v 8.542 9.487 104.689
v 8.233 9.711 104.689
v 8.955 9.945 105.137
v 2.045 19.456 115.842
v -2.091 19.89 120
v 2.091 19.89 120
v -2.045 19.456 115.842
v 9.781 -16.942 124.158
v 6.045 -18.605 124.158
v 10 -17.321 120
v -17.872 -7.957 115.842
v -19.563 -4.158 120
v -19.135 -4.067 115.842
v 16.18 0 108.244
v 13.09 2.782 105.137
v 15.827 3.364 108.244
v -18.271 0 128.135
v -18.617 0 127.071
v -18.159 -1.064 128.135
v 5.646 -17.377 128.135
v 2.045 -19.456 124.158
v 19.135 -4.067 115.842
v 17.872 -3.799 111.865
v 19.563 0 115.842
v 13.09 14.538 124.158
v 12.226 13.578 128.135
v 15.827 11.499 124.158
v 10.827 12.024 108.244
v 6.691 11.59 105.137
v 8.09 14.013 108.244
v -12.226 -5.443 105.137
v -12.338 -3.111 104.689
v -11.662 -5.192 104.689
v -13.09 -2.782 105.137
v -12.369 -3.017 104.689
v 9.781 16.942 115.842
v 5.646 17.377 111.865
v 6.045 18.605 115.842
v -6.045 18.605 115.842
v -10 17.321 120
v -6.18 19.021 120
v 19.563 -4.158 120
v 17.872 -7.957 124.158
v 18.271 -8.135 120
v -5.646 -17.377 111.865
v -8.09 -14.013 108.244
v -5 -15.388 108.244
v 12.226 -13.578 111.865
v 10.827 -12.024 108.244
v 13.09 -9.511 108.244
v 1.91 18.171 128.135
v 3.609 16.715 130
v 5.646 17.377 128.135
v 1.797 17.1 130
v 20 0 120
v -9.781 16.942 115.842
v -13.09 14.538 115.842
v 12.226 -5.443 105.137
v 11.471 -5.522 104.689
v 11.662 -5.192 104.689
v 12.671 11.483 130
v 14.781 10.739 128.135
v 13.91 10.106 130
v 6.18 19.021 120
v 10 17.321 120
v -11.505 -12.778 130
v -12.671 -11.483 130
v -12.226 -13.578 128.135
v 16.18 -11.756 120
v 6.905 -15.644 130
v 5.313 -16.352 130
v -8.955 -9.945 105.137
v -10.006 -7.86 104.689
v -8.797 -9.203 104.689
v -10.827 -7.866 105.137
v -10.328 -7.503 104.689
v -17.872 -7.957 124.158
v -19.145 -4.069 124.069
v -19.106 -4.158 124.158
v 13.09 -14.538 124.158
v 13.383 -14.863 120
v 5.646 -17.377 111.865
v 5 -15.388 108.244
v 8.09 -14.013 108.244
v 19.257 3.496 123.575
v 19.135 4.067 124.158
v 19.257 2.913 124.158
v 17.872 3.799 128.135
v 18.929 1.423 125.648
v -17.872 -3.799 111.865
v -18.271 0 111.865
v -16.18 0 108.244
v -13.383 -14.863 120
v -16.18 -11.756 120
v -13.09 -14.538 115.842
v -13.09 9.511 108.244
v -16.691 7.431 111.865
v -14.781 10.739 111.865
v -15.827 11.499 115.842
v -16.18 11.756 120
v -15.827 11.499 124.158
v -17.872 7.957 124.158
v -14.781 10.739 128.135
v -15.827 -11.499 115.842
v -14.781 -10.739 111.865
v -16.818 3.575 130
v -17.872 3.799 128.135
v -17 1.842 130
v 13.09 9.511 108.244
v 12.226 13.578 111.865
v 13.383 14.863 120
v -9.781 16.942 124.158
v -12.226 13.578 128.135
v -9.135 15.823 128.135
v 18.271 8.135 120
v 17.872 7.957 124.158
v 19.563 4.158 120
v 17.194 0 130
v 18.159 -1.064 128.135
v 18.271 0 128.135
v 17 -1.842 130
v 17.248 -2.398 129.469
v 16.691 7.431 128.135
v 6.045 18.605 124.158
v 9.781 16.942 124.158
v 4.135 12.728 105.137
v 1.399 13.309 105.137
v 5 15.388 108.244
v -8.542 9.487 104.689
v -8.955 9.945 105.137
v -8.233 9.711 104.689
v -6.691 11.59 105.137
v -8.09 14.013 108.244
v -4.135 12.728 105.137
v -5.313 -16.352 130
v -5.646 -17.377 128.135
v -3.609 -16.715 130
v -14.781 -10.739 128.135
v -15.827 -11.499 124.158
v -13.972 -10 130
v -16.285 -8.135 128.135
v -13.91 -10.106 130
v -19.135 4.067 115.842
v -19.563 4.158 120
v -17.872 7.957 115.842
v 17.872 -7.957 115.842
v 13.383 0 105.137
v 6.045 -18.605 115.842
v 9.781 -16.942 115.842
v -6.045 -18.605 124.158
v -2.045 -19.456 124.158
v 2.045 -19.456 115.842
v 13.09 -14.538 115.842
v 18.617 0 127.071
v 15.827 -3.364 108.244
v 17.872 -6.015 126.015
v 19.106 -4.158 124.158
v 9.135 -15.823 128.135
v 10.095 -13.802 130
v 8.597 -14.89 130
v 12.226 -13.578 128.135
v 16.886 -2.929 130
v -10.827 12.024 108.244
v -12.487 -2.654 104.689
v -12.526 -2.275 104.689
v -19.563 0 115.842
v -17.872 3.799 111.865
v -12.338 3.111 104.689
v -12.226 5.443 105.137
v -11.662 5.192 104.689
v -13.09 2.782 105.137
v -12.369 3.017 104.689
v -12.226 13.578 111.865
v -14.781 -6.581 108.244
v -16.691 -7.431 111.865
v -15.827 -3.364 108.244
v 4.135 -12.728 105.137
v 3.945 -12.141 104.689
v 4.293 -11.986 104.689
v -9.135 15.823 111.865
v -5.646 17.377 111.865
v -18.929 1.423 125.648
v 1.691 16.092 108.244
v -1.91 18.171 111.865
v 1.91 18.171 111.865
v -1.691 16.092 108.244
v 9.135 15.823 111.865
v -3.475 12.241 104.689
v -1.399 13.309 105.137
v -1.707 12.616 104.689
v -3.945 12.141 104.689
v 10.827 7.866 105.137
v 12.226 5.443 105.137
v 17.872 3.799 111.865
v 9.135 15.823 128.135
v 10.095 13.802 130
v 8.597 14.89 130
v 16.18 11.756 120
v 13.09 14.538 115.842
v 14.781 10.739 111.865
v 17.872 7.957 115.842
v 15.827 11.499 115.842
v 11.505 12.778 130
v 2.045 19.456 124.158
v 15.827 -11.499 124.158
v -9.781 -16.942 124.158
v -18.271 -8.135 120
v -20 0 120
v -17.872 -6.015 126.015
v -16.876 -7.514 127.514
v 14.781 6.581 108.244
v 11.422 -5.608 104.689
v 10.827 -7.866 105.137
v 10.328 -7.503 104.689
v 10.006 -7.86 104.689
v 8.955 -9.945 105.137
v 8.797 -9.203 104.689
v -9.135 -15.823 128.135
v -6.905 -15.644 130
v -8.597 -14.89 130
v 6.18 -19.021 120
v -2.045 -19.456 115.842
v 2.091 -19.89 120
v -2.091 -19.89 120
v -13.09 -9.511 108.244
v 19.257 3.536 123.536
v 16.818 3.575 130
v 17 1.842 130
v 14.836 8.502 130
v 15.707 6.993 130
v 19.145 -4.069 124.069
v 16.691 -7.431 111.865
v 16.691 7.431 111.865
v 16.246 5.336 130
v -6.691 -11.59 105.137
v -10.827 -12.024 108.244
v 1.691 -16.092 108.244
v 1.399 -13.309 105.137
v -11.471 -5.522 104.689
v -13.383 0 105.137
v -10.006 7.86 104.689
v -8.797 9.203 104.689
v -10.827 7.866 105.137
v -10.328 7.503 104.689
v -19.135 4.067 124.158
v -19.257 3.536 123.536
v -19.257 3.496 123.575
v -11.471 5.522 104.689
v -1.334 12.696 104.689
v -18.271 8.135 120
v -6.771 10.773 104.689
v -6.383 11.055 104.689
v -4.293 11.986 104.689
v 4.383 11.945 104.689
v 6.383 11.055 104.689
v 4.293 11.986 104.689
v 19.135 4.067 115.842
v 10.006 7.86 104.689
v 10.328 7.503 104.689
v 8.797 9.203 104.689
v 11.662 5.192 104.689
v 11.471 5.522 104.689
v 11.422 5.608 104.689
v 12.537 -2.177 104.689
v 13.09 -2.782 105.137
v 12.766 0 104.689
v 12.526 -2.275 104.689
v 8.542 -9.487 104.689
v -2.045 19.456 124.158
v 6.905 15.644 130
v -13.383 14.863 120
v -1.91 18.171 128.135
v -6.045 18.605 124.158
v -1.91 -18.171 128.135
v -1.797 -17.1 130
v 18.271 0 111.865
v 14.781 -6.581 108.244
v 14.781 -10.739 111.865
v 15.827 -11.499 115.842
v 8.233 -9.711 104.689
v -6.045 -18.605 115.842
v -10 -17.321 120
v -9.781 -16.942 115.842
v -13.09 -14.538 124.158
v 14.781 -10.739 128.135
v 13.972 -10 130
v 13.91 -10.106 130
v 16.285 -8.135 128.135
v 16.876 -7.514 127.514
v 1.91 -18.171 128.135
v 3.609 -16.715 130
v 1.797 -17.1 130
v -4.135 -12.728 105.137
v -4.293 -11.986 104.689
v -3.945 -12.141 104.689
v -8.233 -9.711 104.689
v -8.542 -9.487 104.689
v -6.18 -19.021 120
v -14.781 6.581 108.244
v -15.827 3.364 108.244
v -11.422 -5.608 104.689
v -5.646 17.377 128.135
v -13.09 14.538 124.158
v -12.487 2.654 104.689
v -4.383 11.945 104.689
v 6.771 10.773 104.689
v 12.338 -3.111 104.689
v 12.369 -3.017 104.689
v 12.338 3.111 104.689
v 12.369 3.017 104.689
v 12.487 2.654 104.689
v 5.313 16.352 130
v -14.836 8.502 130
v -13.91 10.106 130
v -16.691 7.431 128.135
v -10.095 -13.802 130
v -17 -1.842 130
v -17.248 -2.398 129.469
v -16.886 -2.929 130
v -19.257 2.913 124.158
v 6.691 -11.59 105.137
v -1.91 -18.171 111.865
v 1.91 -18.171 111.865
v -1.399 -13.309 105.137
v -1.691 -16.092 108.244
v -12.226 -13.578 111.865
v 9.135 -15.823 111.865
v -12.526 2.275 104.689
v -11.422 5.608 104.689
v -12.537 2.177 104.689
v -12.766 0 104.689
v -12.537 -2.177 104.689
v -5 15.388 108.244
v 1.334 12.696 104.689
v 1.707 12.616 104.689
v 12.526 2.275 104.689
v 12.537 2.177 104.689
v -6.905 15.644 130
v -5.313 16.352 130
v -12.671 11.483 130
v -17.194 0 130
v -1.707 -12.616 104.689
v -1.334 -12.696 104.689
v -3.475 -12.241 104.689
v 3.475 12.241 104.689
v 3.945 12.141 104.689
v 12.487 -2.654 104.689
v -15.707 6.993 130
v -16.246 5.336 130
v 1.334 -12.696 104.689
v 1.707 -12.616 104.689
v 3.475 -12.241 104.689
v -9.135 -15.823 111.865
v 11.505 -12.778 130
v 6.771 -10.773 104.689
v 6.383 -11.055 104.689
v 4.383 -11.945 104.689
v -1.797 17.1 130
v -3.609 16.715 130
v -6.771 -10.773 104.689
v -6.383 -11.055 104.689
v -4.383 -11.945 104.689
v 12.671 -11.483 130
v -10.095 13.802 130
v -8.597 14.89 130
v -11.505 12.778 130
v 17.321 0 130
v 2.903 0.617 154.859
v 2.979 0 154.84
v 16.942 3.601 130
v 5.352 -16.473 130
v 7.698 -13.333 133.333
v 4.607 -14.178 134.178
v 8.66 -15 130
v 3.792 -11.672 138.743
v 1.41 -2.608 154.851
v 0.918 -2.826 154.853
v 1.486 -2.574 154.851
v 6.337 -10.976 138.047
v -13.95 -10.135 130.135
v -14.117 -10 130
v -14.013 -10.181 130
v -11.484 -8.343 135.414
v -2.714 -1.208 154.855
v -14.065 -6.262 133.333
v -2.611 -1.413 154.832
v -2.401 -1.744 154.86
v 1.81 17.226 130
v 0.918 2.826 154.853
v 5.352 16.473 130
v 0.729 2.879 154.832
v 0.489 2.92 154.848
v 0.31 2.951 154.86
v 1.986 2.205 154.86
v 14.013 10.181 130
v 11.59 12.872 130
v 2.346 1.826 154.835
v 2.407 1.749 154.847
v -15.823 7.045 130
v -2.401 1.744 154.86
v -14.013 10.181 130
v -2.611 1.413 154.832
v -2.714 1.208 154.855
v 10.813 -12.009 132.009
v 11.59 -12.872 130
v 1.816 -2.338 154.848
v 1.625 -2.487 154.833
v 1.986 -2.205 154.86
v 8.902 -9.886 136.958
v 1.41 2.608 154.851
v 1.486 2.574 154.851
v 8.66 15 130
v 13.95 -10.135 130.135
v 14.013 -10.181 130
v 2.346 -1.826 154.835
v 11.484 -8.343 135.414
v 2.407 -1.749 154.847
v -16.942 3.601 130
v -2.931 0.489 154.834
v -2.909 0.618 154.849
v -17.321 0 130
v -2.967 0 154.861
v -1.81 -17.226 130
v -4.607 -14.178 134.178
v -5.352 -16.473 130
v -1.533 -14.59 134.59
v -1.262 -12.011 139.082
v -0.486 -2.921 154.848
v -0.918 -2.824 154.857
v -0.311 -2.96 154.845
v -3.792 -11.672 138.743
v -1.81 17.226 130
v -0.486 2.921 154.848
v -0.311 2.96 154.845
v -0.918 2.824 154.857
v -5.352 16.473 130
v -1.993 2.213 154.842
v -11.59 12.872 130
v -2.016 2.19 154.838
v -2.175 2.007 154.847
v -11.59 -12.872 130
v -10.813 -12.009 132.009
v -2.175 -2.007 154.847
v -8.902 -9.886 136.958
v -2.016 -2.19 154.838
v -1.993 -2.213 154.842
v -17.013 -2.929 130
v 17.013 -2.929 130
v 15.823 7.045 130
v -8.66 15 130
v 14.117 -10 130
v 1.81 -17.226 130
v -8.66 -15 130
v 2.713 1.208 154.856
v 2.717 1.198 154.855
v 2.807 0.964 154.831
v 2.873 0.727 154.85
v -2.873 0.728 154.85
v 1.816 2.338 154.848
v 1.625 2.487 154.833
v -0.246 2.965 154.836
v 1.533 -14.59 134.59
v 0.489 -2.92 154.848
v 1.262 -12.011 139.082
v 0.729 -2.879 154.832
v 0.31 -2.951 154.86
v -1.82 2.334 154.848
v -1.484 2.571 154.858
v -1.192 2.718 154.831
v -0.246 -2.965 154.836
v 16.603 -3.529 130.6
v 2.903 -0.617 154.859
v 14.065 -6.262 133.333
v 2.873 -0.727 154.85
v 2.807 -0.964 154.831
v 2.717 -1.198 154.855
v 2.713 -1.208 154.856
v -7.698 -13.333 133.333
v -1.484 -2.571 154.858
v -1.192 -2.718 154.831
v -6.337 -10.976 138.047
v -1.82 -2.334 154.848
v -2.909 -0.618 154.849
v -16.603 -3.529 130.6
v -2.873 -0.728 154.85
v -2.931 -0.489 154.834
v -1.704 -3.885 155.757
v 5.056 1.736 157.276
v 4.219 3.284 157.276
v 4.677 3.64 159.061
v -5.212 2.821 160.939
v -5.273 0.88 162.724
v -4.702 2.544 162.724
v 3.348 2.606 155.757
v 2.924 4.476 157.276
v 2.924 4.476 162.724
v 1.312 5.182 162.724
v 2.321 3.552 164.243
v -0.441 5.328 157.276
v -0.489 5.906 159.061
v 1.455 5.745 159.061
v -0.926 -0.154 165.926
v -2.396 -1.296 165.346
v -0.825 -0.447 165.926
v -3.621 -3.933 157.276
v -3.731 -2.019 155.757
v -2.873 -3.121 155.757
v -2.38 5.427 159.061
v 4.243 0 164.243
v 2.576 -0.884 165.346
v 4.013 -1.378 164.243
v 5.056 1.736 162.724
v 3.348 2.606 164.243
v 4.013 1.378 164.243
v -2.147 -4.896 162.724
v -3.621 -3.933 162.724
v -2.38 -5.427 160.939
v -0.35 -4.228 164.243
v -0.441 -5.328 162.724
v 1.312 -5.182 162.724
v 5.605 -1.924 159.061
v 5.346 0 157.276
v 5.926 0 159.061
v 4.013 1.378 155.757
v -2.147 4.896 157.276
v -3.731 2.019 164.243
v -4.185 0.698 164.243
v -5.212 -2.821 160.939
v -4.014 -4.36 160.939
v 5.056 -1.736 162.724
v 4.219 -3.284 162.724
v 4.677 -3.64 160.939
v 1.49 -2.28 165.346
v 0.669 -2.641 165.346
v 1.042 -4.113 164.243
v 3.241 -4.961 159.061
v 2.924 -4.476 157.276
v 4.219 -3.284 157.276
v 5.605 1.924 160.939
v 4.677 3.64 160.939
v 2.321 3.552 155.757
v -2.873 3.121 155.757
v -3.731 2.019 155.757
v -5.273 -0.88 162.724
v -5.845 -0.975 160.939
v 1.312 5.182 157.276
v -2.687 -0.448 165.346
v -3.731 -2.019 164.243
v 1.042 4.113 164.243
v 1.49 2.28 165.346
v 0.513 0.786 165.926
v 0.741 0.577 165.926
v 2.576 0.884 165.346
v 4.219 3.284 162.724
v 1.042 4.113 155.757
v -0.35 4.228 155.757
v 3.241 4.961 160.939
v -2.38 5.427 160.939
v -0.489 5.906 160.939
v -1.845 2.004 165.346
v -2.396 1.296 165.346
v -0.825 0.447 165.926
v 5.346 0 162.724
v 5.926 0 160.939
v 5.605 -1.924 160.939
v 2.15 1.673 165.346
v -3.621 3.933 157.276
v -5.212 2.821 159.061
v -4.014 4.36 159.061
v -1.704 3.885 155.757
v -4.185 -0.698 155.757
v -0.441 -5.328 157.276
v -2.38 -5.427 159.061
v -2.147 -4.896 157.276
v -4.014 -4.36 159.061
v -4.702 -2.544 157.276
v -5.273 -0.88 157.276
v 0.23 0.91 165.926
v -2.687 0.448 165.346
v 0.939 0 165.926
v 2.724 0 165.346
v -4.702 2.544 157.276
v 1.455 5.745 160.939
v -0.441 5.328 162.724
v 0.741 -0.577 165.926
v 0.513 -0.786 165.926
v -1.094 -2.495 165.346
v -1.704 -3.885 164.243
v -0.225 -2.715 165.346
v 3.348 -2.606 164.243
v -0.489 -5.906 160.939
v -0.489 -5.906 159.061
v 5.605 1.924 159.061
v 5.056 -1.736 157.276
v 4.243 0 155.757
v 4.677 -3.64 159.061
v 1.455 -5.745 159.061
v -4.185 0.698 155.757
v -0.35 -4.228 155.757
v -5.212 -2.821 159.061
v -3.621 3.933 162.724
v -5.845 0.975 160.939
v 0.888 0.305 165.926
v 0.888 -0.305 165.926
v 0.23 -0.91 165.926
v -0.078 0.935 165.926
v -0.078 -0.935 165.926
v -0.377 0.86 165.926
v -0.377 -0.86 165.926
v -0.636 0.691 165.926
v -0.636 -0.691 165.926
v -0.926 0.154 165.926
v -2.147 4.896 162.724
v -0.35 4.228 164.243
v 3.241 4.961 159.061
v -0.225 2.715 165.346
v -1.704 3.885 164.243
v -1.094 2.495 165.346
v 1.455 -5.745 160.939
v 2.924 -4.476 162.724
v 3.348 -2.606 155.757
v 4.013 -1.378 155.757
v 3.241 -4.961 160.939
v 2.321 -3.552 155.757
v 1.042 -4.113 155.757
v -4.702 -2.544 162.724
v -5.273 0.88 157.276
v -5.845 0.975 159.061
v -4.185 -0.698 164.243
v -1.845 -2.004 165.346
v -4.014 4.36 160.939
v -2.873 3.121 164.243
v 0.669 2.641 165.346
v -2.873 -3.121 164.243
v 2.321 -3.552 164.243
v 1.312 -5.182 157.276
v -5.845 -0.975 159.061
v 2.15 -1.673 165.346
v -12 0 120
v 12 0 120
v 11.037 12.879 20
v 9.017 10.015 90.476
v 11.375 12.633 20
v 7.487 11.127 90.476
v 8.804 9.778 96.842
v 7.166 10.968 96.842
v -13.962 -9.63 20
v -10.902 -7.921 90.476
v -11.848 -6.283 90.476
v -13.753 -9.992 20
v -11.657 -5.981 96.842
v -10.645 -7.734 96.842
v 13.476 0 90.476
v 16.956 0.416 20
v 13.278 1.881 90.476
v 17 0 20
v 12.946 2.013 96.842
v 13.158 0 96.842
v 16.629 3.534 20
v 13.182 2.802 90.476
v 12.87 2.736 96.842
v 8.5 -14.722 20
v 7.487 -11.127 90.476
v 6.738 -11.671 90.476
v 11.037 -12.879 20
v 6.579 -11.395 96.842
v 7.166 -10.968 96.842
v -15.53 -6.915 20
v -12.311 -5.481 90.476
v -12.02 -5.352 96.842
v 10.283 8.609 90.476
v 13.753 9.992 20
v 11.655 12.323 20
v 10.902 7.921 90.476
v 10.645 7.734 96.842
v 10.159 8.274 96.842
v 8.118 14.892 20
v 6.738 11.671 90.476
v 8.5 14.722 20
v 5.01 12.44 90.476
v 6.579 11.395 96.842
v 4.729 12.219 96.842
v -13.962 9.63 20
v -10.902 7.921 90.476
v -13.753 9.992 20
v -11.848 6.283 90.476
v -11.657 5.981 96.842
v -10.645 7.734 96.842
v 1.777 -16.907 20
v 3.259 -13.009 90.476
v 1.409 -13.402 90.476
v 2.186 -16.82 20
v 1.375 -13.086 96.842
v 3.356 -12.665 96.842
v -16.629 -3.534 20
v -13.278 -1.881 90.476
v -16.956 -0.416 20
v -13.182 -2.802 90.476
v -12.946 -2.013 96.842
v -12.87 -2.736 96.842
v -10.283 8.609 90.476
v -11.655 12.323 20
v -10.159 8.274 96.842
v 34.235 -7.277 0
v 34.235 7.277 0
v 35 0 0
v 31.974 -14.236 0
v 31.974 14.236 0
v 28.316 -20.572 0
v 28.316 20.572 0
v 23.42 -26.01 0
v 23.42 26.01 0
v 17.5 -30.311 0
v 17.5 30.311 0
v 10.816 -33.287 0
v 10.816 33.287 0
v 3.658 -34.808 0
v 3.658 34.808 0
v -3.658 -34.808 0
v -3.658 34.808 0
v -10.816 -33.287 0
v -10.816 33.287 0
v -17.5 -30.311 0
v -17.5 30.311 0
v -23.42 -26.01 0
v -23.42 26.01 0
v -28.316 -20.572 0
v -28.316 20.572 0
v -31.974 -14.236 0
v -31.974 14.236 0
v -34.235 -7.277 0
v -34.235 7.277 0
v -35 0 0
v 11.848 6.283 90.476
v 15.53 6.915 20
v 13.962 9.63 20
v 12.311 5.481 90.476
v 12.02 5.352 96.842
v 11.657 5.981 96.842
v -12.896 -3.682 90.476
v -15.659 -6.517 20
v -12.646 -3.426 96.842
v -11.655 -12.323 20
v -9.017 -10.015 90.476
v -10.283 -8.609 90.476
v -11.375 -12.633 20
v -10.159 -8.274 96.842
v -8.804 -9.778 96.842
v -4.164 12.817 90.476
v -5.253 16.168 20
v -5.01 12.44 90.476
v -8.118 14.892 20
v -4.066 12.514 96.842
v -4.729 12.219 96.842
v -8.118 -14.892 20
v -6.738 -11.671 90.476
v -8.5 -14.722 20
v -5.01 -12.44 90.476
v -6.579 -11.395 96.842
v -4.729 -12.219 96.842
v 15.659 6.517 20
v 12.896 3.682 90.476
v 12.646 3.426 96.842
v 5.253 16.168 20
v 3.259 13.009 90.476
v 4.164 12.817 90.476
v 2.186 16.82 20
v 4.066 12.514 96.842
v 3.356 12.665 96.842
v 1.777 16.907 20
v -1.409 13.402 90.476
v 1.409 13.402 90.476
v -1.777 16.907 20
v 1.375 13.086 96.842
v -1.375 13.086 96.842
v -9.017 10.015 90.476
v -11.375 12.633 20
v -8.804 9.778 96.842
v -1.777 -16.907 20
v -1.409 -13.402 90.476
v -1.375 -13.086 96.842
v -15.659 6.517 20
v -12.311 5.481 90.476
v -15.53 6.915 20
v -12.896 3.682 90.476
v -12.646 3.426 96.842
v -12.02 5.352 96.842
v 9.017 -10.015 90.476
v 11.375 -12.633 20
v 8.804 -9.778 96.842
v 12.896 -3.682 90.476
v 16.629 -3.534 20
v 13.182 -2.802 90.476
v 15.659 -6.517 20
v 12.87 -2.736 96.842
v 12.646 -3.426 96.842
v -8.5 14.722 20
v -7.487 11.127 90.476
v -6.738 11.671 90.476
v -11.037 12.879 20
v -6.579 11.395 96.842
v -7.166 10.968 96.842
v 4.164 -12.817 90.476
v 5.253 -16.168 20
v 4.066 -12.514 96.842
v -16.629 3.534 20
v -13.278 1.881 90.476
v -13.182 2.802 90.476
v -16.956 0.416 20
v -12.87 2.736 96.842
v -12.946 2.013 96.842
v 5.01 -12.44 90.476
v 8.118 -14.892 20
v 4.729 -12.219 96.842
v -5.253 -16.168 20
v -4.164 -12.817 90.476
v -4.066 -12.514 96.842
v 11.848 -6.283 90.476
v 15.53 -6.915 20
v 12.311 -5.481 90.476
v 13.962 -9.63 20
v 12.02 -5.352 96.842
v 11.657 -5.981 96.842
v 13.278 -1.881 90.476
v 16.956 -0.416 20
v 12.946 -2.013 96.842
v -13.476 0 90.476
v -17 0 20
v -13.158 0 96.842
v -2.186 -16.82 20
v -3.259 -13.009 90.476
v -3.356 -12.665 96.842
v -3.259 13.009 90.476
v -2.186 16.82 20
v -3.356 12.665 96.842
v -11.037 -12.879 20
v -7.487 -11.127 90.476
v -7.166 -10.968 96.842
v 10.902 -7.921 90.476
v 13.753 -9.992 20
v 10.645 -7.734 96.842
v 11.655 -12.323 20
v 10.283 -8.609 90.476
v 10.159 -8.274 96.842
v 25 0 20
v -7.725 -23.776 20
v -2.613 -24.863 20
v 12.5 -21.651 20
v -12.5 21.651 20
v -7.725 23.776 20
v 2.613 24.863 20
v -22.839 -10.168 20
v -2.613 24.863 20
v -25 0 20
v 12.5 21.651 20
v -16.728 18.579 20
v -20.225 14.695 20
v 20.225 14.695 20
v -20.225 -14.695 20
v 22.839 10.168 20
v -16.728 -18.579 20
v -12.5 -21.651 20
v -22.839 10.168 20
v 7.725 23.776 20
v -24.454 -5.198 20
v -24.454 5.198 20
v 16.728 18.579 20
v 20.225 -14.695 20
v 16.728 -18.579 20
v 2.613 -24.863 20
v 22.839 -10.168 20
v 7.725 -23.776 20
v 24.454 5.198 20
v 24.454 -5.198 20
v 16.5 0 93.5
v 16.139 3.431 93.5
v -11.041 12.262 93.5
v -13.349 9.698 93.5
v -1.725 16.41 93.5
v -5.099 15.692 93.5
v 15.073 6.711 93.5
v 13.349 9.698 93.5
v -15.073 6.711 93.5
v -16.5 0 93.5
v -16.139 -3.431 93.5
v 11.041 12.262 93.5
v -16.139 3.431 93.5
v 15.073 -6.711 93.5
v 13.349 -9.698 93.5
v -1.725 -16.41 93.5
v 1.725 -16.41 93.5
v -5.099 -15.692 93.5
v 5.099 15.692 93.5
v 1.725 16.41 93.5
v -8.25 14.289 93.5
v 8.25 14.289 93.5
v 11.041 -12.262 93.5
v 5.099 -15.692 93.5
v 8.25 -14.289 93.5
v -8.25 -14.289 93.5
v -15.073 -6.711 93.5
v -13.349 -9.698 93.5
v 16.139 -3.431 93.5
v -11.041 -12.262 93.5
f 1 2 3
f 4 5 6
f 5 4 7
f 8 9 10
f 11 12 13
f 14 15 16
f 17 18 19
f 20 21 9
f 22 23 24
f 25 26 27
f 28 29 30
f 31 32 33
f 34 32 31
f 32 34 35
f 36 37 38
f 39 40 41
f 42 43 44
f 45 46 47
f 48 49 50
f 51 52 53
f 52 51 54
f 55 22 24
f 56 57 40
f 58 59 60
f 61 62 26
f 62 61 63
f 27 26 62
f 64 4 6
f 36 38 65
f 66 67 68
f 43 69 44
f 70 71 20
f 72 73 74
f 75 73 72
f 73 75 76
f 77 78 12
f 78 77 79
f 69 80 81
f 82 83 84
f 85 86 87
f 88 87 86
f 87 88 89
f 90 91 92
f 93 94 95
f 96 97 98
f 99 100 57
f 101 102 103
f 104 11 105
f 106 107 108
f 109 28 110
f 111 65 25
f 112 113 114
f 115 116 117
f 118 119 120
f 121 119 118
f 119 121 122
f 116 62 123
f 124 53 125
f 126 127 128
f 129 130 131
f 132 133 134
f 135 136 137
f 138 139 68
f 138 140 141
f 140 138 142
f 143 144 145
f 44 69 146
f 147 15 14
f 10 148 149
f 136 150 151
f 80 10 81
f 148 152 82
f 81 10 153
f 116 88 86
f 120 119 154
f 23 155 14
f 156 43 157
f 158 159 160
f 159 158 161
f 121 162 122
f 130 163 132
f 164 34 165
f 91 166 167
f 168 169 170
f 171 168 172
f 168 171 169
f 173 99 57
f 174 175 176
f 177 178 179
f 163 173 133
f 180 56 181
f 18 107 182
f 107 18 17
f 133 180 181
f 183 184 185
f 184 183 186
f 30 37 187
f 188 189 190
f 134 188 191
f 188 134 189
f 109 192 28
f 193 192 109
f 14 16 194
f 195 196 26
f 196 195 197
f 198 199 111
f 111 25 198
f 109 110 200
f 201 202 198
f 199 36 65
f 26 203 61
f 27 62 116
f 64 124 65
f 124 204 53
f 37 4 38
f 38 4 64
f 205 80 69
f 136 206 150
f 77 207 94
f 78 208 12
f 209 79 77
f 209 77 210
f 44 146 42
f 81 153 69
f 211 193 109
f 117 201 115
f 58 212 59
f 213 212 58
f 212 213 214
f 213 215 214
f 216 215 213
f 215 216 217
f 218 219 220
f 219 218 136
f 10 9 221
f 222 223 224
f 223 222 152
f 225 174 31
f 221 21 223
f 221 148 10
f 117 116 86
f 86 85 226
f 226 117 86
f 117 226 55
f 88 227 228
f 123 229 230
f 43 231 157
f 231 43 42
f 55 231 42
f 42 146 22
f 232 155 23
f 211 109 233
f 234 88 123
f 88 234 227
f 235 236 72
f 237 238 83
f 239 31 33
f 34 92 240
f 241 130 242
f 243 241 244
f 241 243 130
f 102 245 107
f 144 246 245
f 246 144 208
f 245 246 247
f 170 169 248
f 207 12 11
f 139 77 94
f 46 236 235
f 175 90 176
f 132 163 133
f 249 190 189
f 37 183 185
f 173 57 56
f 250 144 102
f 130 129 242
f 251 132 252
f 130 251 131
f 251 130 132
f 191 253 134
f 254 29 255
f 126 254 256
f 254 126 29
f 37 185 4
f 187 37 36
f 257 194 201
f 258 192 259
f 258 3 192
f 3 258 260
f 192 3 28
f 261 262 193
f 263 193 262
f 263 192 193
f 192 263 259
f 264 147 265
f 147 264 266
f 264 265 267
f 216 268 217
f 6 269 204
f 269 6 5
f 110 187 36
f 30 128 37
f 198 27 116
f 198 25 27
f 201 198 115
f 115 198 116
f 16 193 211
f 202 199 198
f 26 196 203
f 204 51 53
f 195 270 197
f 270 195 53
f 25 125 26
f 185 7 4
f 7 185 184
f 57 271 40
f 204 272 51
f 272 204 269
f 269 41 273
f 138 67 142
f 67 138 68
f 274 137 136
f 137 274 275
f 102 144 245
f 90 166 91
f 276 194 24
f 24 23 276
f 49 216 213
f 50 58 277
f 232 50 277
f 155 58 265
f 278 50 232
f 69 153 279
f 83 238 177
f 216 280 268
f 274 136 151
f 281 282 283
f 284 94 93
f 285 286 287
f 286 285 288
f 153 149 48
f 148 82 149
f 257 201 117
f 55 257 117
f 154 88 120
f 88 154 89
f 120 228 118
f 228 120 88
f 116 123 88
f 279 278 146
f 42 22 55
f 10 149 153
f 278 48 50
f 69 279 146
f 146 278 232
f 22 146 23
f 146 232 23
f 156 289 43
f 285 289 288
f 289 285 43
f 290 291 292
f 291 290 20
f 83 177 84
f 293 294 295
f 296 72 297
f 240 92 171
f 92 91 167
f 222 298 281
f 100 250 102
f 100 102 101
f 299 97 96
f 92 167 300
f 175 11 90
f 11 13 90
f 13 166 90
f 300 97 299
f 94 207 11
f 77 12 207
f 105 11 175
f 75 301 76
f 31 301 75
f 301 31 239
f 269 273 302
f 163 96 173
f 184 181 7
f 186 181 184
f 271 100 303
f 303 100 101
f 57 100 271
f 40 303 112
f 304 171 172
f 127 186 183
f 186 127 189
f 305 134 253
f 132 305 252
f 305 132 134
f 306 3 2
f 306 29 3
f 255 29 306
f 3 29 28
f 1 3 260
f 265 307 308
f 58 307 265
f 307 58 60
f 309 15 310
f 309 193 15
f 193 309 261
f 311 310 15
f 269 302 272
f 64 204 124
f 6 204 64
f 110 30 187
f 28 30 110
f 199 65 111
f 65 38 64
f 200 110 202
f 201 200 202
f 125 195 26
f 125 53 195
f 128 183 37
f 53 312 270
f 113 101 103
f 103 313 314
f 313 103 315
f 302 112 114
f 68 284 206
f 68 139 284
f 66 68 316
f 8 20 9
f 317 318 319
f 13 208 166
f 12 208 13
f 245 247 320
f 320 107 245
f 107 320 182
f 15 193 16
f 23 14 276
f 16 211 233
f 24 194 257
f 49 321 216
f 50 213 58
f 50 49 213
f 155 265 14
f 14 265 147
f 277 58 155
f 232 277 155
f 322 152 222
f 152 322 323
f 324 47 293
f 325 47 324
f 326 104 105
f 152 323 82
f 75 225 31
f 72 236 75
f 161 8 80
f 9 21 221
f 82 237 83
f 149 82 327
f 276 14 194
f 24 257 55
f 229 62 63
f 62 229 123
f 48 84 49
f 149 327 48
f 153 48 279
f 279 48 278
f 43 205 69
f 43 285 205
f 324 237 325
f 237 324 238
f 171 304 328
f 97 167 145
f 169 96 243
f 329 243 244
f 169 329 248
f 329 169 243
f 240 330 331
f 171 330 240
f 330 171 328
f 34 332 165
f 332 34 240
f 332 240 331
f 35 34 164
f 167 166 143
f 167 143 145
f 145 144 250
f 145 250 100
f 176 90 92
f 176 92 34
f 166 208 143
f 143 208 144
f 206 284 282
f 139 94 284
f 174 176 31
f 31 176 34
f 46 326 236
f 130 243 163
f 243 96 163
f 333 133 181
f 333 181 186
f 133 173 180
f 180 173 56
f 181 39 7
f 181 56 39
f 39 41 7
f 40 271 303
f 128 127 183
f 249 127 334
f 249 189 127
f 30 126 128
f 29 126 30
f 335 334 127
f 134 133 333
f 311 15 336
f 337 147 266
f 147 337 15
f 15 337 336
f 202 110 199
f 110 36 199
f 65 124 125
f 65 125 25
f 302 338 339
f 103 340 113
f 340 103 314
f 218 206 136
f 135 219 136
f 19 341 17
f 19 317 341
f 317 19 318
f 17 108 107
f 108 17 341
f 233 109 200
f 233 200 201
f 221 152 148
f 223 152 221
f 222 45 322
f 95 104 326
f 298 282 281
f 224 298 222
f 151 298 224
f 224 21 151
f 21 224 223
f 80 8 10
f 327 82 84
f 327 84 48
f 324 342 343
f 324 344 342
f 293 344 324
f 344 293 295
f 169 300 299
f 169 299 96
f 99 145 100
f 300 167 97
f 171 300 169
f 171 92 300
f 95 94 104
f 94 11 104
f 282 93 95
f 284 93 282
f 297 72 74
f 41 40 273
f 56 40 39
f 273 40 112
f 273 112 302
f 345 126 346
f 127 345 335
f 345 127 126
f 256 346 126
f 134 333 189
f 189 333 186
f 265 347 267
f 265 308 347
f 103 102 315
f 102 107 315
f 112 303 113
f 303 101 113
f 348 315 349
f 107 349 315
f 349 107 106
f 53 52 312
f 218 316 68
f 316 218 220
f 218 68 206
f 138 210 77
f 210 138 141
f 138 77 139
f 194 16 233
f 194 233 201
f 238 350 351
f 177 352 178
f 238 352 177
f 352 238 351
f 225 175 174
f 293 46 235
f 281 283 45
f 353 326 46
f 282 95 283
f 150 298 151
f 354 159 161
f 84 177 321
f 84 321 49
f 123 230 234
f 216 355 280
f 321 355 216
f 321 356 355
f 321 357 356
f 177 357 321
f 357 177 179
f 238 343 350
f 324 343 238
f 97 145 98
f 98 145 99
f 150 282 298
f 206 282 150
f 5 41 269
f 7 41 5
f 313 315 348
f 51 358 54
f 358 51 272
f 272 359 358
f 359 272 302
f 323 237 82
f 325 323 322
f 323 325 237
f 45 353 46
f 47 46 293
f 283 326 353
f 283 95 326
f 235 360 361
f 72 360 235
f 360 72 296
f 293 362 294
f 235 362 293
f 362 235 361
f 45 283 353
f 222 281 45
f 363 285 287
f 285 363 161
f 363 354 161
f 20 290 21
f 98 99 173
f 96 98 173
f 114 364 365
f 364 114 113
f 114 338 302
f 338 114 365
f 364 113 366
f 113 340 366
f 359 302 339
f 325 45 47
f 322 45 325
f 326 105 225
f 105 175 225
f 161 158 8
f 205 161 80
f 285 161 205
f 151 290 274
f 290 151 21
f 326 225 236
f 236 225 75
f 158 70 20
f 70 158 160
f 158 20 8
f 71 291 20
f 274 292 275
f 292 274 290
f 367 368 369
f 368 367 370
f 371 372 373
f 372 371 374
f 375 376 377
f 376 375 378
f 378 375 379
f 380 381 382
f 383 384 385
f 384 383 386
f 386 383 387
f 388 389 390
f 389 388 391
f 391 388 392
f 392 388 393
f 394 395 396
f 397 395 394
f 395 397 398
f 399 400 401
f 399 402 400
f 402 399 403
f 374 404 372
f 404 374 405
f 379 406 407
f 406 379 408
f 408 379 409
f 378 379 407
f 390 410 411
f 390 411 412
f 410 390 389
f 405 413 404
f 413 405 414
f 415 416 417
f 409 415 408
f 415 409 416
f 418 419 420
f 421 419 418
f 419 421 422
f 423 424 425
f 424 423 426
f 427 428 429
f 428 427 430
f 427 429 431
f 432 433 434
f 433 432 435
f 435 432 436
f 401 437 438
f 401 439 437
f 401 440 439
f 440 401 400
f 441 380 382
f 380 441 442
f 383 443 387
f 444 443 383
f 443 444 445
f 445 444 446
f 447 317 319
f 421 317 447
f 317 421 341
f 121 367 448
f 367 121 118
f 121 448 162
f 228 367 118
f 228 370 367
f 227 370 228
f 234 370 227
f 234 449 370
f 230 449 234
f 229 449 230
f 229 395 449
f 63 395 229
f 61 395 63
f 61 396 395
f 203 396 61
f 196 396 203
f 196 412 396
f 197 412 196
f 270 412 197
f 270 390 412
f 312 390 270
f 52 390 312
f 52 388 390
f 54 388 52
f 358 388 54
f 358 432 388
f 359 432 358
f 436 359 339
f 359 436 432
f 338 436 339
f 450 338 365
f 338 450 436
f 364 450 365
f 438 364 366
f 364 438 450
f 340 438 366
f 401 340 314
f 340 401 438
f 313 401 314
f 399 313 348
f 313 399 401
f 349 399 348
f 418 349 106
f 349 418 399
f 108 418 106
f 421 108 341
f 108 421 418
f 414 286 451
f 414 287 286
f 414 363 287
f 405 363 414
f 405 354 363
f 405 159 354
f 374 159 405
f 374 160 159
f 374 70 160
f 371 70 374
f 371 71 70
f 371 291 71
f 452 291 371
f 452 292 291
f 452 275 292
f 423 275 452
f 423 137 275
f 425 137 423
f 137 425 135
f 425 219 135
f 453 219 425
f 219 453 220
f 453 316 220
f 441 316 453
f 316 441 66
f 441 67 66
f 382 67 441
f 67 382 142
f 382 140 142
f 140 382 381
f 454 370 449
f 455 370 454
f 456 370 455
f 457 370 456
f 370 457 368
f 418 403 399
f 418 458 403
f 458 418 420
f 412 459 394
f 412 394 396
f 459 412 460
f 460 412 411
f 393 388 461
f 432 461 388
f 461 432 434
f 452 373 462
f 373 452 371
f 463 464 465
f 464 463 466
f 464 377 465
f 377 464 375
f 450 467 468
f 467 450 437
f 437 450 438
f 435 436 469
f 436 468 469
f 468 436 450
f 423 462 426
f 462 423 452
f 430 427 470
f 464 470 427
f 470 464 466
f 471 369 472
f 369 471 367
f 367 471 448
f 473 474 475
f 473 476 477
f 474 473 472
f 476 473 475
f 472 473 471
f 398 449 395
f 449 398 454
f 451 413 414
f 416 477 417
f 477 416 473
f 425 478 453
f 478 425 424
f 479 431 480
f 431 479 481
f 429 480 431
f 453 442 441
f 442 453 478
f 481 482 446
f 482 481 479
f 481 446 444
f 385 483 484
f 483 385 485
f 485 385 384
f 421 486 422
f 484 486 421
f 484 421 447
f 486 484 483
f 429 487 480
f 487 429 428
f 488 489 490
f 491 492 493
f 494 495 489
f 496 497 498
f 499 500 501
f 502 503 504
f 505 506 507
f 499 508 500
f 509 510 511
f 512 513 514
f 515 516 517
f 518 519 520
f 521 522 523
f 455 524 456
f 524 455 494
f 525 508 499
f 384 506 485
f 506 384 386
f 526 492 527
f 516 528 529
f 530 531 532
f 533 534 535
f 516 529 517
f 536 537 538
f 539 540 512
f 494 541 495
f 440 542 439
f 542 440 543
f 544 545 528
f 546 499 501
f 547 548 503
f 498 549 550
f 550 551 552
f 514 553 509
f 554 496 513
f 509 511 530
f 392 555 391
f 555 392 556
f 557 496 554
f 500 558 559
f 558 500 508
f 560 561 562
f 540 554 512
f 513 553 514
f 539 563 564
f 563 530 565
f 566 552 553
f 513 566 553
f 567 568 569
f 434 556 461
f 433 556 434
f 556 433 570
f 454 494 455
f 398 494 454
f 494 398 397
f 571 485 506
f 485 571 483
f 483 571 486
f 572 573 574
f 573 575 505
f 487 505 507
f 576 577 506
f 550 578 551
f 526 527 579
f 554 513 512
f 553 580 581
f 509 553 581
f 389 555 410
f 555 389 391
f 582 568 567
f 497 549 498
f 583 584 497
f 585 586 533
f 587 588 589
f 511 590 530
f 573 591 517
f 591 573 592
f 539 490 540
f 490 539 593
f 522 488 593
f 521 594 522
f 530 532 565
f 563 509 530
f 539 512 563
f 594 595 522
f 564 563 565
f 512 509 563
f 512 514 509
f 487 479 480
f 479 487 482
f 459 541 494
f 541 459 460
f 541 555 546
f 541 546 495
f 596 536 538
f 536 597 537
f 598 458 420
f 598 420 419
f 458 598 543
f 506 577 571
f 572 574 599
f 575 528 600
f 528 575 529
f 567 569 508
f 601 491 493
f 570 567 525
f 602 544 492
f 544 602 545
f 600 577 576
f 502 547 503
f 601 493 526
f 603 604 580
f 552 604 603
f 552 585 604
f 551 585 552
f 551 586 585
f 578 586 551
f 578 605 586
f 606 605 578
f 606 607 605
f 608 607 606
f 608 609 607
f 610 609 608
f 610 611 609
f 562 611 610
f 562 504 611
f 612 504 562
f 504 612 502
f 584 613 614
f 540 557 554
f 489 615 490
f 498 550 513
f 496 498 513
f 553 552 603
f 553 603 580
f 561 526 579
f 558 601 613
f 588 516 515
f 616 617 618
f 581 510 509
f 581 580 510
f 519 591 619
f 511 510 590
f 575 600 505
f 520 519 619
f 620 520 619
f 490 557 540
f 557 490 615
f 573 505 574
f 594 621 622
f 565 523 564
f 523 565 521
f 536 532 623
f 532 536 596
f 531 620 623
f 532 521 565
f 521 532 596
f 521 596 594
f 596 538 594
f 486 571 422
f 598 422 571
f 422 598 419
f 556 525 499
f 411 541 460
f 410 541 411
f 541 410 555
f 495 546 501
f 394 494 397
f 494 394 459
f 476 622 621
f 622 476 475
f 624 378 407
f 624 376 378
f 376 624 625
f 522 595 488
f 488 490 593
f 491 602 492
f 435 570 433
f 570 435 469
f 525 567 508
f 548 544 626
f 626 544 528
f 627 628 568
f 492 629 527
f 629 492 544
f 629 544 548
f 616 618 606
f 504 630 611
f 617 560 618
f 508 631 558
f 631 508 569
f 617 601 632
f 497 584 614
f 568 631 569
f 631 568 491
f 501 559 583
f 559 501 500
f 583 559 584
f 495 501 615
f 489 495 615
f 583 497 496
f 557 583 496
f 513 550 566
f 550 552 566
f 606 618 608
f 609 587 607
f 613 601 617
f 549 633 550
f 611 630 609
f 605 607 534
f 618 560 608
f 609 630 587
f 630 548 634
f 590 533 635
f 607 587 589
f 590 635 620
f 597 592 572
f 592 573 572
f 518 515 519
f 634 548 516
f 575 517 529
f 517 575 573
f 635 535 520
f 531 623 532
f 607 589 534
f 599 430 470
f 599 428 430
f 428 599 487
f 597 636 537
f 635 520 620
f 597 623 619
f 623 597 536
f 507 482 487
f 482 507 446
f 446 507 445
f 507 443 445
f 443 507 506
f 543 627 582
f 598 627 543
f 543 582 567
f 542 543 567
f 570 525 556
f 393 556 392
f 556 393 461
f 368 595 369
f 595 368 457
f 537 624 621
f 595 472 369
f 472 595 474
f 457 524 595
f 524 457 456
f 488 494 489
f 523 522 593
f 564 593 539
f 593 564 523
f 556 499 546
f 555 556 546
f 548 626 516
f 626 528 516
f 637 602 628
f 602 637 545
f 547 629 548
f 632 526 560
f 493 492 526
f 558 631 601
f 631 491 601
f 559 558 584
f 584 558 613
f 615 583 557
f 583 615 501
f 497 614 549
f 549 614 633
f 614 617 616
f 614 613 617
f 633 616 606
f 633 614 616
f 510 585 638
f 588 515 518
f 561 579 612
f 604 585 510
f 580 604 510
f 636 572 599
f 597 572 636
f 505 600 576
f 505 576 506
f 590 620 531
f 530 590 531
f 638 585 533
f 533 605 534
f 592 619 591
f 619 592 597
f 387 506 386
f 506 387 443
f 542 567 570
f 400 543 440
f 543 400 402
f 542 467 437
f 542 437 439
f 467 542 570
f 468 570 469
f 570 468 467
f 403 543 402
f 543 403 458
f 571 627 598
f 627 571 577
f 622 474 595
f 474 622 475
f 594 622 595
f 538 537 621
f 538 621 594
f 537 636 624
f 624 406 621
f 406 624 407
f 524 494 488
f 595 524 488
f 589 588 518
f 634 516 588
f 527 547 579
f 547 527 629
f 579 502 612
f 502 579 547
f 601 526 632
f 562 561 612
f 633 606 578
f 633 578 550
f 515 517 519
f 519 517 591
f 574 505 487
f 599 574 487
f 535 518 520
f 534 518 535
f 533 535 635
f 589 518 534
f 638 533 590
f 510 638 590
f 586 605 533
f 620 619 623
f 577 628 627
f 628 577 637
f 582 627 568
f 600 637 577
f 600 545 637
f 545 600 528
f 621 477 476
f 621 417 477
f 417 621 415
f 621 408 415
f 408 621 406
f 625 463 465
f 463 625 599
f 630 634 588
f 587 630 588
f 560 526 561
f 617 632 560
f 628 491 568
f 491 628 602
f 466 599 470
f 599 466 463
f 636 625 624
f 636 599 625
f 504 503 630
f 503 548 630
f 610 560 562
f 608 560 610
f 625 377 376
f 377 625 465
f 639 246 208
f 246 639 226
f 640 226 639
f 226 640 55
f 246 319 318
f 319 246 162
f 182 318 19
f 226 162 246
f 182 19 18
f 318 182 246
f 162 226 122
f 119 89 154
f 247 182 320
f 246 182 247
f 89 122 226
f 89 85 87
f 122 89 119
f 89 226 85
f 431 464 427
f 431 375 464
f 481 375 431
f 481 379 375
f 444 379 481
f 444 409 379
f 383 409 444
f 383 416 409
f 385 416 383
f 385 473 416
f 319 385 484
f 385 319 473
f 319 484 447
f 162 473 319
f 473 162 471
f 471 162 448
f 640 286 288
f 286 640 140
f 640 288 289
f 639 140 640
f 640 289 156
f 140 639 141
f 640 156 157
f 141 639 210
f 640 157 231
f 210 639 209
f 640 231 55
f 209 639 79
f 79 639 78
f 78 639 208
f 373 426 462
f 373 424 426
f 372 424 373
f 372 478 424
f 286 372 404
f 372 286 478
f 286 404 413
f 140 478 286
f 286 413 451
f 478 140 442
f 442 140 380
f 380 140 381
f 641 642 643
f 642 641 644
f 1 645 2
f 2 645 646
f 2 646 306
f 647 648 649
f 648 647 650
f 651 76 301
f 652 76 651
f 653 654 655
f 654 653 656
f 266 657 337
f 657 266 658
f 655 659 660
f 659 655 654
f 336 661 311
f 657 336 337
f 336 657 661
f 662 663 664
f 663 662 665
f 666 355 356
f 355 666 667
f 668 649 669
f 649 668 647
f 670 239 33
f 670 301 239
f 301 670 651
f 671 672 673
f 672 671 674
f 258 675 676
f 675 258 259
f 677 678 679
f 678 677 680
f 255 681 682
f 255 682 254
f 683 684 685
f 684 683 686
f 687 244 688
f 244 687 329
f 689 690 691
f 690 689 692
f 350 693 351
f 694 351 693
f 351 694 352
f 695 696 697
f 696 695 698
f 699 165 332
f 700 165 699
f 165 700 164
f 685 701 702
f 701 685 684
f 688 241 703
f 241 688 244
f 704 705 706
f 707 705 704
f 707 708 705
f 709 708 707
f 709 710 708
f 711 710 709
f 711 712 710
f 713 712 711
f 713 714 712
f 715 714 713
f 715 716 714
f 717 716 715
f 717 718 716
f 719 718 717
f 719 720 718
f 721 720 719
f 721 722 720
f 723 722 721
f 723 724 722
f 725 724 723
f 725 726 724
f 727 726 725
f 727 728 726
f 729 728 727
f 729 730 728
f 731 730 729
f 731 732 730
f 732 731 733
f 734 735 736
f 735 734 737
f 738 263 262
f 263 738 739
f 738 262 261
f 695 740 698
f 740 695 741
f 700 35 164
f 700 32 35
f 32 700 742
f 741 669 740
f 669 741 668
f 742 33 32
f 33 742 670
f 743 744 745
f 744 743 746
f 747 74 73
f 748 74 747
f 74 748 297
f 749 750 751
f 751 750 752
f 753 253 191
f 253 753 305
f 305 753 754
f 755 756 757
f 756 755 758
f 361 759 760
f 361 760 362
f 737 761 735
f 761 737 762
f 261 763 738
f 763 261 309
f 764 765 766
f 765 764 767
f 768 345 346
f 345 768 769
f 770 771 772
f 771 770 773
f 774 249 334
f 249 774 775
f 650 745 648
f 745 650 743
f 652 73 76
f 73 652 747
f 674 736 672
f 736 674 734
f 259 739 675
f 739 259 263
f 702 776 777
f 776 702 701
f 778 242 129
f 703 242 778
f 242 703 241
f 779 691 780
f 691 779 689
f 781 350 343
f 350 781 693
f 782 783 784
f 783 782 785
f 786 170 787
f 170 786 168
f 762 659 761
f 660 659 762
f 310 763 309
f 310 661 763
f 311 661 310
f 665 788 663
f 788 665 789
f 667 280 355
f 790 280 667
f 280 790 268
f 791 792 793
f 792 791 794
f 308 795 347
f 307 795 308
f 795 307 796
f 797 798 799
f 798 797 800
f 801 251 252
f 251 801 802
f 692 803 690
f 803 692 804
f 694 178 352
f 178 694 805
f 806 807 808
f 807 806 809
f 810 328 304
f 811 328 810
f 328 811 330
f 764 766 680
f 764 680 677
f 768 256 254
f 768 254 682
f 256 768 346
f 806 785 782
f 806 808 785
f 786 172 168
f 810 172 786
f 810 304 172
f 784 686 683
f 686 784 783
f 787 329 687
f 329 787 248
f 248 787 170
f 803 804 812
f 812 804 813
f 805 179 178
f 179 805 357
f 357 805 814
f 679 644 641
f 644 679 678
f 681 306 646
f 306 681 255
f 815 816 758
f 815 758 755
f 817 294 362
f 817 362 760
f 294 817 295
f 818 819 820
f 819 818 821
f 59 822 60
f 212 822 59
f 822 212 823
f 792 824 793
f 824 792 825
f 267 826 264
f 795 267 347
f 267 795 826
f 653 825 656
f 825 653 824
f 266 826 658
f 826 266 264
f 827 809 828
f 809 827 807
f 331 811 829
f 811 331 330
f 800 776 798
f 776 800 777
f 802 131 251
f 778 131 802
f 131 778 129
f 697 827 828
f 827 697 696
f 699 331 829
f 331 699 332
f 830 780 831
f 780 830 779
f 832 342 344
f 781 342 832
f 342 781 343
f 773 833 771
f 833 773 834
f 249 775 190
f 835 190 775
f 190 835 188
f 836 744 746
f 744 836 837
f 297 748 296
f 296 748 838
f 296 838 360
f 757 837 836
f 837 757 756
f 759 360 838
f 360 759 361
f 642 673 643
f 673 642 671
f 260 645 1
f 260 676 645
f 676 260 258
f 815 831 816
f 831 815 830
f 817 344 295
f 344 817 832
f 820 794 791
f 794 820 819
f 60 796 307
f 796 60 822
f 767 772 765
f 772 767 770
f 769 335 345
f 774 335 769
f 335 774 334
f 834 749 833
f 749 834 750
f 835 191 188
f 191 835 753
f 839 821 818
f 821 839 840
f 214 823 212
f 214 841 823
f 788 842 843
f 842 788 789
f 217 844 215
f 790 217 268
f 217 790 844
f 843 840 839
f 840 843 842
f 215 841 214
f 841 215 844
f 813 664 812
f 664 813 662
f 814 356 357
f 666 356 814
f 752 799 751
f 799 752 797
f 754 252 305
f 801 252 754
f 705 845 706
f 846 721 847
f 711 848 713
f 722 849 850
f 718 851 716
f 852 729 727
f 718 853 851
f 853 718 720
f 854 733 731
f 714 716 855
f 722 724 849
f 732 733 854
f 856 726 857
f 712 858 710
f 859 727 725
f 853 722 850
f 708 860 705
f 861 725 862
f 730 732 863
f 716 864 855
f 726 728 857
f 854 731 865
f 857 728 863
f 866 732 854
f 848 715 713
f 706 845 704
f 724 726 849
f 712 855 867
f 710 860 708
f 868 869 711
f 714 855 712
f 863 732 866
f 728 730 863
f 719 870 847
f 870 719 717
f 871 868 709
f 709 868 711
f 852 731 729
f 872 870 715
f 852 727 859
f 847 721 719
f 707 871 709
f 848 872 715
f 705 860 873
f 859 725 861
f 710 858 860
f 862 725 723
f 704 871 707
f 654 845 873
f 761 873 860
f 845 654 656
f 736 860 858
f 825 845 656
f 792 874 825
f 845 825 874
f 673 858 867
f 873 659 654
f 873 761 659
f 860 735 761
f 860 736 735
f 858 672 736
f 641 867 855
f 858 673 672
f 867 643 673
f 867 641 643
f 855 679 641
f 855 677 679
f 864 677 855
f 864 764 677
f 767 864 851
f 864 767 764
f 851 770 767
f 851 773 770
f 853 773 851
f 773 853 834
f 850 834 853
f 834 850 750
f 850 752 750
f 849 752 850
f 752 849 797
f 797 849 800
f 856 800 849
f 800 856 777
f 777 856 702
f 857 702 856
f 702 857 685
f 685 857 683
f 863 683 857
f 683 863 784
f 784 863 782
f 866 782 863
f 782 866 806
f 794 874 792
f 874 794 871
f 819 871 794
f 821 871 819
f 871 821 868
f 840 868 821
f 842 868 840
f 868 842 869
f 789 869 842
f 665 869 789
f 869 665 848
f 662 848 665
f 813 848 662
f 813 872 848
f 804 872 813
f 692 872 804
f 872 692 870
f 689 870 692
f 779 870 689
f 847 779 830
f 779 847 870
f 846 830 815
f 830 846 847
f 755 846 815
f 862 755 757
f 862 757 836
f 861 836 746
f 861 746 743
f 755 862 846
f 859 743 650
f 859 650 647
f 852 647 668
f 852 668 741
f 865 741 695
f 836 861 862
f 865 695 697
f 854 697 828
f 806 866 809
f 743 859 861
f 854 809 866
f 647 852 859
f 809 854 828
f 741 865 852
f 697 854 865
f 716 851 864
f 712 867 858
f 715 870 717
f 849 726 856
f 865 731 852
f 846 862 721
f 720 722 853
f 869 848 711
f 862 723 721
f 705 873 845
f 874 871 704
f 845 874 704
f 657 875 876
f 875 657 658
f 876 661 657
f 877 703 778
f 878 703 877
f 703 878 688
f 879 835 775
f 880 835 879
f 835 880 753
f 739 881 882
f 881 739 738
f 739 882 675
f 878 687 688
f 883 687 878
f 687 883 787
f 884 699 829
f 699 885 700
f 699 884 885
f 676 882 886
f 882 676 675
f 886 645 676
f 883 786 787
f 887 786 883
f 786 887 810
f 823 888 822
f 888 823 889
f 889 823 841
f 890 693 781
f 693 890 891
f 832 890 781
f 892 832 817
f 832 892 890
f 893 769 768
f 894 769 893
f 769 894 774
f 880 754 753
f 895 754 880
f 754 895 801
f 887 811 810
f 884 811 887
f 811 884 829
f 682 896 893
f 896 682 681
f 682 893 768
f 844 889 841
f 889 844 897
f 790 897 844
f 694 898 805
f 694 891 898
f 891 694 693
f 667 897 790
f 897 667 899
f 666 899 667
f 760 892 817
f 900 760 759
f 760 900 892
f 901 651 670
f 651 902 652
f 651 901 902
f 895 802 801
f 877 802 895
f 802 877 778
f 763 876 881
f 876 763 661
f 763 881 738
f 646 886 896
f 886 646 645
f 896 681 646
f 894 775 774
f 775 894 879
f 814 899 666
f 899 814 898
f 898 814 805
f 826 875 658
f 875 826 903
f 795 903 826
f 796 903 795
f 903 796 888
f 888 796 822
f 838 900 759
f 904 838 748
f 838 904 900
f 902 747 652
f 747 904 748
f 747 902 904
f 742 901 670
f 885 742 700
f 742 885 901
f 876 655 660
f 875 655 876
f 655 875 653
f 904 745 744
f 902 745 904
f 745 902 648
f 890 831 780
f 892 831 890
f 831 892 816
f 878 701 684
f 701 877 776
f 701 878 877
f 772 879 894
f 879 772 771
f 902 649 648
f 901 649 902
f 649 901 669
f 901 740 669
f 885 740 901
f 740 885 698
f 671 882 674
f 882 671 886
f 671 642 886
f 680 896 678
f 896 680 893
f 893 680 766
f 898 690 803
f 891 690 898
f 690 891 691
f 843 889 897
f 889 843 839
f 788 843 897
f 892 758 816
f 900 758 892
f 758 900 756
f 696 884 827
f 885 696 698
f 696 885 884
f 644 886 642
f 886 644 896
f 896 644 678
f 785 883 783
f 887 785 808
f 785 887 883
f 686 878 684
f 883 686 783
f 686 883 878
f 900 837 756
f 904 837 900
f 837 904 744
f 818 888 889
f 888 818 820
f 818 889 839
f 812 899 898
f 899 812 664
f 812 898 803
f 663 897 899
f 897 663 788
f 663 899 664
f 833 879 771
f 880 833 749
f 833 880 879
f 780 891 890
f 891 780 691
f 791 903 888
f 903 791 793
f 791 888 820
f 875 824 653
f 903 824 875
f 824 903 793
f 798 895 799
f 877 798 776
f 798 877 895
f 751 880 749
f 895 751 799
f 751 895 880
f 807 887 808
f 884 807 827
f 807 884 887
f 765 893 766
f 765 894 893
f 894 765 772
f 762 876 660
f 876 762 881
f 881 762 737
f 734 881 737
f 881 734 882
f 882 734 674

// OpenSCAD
// https://cubehero.com/2013/11/19/know-only-10-things-to-be-dangerous-in-openscad/

union() {
  translate([0, 0, 120])
    difference() {
      union() {
        // teardrop shape
        sphere(r = 20);
        translate([0, 0, 20 * sin(30)])
          cylinder(h = 30, r1 = 20 * cos(30),     r2 = 0);

      // dollop
      translate([0,0,30 + 20 * sin(30)])
        sphere(r = 6);
      }
    
      rotate([45, 0, 0])
        translate([-20, 0, 0])
        cube([40, 5, 40]);
    }

  // neck
  cylinder(h = 120, r1 = 18, r2 = 12);
  
  // base
  cylinder(h = 20, r1 = 35, r2 = 25);
}

translate([0, 0, 90])
  intersection() {
    cylinder(h = 20, r1 = 20, r2 = 0);
    translate([0, 0, 7])
      mirror([0, 0, 1])
      cylinder(h = 20, r1 = 20, r2 = 0);
  }
